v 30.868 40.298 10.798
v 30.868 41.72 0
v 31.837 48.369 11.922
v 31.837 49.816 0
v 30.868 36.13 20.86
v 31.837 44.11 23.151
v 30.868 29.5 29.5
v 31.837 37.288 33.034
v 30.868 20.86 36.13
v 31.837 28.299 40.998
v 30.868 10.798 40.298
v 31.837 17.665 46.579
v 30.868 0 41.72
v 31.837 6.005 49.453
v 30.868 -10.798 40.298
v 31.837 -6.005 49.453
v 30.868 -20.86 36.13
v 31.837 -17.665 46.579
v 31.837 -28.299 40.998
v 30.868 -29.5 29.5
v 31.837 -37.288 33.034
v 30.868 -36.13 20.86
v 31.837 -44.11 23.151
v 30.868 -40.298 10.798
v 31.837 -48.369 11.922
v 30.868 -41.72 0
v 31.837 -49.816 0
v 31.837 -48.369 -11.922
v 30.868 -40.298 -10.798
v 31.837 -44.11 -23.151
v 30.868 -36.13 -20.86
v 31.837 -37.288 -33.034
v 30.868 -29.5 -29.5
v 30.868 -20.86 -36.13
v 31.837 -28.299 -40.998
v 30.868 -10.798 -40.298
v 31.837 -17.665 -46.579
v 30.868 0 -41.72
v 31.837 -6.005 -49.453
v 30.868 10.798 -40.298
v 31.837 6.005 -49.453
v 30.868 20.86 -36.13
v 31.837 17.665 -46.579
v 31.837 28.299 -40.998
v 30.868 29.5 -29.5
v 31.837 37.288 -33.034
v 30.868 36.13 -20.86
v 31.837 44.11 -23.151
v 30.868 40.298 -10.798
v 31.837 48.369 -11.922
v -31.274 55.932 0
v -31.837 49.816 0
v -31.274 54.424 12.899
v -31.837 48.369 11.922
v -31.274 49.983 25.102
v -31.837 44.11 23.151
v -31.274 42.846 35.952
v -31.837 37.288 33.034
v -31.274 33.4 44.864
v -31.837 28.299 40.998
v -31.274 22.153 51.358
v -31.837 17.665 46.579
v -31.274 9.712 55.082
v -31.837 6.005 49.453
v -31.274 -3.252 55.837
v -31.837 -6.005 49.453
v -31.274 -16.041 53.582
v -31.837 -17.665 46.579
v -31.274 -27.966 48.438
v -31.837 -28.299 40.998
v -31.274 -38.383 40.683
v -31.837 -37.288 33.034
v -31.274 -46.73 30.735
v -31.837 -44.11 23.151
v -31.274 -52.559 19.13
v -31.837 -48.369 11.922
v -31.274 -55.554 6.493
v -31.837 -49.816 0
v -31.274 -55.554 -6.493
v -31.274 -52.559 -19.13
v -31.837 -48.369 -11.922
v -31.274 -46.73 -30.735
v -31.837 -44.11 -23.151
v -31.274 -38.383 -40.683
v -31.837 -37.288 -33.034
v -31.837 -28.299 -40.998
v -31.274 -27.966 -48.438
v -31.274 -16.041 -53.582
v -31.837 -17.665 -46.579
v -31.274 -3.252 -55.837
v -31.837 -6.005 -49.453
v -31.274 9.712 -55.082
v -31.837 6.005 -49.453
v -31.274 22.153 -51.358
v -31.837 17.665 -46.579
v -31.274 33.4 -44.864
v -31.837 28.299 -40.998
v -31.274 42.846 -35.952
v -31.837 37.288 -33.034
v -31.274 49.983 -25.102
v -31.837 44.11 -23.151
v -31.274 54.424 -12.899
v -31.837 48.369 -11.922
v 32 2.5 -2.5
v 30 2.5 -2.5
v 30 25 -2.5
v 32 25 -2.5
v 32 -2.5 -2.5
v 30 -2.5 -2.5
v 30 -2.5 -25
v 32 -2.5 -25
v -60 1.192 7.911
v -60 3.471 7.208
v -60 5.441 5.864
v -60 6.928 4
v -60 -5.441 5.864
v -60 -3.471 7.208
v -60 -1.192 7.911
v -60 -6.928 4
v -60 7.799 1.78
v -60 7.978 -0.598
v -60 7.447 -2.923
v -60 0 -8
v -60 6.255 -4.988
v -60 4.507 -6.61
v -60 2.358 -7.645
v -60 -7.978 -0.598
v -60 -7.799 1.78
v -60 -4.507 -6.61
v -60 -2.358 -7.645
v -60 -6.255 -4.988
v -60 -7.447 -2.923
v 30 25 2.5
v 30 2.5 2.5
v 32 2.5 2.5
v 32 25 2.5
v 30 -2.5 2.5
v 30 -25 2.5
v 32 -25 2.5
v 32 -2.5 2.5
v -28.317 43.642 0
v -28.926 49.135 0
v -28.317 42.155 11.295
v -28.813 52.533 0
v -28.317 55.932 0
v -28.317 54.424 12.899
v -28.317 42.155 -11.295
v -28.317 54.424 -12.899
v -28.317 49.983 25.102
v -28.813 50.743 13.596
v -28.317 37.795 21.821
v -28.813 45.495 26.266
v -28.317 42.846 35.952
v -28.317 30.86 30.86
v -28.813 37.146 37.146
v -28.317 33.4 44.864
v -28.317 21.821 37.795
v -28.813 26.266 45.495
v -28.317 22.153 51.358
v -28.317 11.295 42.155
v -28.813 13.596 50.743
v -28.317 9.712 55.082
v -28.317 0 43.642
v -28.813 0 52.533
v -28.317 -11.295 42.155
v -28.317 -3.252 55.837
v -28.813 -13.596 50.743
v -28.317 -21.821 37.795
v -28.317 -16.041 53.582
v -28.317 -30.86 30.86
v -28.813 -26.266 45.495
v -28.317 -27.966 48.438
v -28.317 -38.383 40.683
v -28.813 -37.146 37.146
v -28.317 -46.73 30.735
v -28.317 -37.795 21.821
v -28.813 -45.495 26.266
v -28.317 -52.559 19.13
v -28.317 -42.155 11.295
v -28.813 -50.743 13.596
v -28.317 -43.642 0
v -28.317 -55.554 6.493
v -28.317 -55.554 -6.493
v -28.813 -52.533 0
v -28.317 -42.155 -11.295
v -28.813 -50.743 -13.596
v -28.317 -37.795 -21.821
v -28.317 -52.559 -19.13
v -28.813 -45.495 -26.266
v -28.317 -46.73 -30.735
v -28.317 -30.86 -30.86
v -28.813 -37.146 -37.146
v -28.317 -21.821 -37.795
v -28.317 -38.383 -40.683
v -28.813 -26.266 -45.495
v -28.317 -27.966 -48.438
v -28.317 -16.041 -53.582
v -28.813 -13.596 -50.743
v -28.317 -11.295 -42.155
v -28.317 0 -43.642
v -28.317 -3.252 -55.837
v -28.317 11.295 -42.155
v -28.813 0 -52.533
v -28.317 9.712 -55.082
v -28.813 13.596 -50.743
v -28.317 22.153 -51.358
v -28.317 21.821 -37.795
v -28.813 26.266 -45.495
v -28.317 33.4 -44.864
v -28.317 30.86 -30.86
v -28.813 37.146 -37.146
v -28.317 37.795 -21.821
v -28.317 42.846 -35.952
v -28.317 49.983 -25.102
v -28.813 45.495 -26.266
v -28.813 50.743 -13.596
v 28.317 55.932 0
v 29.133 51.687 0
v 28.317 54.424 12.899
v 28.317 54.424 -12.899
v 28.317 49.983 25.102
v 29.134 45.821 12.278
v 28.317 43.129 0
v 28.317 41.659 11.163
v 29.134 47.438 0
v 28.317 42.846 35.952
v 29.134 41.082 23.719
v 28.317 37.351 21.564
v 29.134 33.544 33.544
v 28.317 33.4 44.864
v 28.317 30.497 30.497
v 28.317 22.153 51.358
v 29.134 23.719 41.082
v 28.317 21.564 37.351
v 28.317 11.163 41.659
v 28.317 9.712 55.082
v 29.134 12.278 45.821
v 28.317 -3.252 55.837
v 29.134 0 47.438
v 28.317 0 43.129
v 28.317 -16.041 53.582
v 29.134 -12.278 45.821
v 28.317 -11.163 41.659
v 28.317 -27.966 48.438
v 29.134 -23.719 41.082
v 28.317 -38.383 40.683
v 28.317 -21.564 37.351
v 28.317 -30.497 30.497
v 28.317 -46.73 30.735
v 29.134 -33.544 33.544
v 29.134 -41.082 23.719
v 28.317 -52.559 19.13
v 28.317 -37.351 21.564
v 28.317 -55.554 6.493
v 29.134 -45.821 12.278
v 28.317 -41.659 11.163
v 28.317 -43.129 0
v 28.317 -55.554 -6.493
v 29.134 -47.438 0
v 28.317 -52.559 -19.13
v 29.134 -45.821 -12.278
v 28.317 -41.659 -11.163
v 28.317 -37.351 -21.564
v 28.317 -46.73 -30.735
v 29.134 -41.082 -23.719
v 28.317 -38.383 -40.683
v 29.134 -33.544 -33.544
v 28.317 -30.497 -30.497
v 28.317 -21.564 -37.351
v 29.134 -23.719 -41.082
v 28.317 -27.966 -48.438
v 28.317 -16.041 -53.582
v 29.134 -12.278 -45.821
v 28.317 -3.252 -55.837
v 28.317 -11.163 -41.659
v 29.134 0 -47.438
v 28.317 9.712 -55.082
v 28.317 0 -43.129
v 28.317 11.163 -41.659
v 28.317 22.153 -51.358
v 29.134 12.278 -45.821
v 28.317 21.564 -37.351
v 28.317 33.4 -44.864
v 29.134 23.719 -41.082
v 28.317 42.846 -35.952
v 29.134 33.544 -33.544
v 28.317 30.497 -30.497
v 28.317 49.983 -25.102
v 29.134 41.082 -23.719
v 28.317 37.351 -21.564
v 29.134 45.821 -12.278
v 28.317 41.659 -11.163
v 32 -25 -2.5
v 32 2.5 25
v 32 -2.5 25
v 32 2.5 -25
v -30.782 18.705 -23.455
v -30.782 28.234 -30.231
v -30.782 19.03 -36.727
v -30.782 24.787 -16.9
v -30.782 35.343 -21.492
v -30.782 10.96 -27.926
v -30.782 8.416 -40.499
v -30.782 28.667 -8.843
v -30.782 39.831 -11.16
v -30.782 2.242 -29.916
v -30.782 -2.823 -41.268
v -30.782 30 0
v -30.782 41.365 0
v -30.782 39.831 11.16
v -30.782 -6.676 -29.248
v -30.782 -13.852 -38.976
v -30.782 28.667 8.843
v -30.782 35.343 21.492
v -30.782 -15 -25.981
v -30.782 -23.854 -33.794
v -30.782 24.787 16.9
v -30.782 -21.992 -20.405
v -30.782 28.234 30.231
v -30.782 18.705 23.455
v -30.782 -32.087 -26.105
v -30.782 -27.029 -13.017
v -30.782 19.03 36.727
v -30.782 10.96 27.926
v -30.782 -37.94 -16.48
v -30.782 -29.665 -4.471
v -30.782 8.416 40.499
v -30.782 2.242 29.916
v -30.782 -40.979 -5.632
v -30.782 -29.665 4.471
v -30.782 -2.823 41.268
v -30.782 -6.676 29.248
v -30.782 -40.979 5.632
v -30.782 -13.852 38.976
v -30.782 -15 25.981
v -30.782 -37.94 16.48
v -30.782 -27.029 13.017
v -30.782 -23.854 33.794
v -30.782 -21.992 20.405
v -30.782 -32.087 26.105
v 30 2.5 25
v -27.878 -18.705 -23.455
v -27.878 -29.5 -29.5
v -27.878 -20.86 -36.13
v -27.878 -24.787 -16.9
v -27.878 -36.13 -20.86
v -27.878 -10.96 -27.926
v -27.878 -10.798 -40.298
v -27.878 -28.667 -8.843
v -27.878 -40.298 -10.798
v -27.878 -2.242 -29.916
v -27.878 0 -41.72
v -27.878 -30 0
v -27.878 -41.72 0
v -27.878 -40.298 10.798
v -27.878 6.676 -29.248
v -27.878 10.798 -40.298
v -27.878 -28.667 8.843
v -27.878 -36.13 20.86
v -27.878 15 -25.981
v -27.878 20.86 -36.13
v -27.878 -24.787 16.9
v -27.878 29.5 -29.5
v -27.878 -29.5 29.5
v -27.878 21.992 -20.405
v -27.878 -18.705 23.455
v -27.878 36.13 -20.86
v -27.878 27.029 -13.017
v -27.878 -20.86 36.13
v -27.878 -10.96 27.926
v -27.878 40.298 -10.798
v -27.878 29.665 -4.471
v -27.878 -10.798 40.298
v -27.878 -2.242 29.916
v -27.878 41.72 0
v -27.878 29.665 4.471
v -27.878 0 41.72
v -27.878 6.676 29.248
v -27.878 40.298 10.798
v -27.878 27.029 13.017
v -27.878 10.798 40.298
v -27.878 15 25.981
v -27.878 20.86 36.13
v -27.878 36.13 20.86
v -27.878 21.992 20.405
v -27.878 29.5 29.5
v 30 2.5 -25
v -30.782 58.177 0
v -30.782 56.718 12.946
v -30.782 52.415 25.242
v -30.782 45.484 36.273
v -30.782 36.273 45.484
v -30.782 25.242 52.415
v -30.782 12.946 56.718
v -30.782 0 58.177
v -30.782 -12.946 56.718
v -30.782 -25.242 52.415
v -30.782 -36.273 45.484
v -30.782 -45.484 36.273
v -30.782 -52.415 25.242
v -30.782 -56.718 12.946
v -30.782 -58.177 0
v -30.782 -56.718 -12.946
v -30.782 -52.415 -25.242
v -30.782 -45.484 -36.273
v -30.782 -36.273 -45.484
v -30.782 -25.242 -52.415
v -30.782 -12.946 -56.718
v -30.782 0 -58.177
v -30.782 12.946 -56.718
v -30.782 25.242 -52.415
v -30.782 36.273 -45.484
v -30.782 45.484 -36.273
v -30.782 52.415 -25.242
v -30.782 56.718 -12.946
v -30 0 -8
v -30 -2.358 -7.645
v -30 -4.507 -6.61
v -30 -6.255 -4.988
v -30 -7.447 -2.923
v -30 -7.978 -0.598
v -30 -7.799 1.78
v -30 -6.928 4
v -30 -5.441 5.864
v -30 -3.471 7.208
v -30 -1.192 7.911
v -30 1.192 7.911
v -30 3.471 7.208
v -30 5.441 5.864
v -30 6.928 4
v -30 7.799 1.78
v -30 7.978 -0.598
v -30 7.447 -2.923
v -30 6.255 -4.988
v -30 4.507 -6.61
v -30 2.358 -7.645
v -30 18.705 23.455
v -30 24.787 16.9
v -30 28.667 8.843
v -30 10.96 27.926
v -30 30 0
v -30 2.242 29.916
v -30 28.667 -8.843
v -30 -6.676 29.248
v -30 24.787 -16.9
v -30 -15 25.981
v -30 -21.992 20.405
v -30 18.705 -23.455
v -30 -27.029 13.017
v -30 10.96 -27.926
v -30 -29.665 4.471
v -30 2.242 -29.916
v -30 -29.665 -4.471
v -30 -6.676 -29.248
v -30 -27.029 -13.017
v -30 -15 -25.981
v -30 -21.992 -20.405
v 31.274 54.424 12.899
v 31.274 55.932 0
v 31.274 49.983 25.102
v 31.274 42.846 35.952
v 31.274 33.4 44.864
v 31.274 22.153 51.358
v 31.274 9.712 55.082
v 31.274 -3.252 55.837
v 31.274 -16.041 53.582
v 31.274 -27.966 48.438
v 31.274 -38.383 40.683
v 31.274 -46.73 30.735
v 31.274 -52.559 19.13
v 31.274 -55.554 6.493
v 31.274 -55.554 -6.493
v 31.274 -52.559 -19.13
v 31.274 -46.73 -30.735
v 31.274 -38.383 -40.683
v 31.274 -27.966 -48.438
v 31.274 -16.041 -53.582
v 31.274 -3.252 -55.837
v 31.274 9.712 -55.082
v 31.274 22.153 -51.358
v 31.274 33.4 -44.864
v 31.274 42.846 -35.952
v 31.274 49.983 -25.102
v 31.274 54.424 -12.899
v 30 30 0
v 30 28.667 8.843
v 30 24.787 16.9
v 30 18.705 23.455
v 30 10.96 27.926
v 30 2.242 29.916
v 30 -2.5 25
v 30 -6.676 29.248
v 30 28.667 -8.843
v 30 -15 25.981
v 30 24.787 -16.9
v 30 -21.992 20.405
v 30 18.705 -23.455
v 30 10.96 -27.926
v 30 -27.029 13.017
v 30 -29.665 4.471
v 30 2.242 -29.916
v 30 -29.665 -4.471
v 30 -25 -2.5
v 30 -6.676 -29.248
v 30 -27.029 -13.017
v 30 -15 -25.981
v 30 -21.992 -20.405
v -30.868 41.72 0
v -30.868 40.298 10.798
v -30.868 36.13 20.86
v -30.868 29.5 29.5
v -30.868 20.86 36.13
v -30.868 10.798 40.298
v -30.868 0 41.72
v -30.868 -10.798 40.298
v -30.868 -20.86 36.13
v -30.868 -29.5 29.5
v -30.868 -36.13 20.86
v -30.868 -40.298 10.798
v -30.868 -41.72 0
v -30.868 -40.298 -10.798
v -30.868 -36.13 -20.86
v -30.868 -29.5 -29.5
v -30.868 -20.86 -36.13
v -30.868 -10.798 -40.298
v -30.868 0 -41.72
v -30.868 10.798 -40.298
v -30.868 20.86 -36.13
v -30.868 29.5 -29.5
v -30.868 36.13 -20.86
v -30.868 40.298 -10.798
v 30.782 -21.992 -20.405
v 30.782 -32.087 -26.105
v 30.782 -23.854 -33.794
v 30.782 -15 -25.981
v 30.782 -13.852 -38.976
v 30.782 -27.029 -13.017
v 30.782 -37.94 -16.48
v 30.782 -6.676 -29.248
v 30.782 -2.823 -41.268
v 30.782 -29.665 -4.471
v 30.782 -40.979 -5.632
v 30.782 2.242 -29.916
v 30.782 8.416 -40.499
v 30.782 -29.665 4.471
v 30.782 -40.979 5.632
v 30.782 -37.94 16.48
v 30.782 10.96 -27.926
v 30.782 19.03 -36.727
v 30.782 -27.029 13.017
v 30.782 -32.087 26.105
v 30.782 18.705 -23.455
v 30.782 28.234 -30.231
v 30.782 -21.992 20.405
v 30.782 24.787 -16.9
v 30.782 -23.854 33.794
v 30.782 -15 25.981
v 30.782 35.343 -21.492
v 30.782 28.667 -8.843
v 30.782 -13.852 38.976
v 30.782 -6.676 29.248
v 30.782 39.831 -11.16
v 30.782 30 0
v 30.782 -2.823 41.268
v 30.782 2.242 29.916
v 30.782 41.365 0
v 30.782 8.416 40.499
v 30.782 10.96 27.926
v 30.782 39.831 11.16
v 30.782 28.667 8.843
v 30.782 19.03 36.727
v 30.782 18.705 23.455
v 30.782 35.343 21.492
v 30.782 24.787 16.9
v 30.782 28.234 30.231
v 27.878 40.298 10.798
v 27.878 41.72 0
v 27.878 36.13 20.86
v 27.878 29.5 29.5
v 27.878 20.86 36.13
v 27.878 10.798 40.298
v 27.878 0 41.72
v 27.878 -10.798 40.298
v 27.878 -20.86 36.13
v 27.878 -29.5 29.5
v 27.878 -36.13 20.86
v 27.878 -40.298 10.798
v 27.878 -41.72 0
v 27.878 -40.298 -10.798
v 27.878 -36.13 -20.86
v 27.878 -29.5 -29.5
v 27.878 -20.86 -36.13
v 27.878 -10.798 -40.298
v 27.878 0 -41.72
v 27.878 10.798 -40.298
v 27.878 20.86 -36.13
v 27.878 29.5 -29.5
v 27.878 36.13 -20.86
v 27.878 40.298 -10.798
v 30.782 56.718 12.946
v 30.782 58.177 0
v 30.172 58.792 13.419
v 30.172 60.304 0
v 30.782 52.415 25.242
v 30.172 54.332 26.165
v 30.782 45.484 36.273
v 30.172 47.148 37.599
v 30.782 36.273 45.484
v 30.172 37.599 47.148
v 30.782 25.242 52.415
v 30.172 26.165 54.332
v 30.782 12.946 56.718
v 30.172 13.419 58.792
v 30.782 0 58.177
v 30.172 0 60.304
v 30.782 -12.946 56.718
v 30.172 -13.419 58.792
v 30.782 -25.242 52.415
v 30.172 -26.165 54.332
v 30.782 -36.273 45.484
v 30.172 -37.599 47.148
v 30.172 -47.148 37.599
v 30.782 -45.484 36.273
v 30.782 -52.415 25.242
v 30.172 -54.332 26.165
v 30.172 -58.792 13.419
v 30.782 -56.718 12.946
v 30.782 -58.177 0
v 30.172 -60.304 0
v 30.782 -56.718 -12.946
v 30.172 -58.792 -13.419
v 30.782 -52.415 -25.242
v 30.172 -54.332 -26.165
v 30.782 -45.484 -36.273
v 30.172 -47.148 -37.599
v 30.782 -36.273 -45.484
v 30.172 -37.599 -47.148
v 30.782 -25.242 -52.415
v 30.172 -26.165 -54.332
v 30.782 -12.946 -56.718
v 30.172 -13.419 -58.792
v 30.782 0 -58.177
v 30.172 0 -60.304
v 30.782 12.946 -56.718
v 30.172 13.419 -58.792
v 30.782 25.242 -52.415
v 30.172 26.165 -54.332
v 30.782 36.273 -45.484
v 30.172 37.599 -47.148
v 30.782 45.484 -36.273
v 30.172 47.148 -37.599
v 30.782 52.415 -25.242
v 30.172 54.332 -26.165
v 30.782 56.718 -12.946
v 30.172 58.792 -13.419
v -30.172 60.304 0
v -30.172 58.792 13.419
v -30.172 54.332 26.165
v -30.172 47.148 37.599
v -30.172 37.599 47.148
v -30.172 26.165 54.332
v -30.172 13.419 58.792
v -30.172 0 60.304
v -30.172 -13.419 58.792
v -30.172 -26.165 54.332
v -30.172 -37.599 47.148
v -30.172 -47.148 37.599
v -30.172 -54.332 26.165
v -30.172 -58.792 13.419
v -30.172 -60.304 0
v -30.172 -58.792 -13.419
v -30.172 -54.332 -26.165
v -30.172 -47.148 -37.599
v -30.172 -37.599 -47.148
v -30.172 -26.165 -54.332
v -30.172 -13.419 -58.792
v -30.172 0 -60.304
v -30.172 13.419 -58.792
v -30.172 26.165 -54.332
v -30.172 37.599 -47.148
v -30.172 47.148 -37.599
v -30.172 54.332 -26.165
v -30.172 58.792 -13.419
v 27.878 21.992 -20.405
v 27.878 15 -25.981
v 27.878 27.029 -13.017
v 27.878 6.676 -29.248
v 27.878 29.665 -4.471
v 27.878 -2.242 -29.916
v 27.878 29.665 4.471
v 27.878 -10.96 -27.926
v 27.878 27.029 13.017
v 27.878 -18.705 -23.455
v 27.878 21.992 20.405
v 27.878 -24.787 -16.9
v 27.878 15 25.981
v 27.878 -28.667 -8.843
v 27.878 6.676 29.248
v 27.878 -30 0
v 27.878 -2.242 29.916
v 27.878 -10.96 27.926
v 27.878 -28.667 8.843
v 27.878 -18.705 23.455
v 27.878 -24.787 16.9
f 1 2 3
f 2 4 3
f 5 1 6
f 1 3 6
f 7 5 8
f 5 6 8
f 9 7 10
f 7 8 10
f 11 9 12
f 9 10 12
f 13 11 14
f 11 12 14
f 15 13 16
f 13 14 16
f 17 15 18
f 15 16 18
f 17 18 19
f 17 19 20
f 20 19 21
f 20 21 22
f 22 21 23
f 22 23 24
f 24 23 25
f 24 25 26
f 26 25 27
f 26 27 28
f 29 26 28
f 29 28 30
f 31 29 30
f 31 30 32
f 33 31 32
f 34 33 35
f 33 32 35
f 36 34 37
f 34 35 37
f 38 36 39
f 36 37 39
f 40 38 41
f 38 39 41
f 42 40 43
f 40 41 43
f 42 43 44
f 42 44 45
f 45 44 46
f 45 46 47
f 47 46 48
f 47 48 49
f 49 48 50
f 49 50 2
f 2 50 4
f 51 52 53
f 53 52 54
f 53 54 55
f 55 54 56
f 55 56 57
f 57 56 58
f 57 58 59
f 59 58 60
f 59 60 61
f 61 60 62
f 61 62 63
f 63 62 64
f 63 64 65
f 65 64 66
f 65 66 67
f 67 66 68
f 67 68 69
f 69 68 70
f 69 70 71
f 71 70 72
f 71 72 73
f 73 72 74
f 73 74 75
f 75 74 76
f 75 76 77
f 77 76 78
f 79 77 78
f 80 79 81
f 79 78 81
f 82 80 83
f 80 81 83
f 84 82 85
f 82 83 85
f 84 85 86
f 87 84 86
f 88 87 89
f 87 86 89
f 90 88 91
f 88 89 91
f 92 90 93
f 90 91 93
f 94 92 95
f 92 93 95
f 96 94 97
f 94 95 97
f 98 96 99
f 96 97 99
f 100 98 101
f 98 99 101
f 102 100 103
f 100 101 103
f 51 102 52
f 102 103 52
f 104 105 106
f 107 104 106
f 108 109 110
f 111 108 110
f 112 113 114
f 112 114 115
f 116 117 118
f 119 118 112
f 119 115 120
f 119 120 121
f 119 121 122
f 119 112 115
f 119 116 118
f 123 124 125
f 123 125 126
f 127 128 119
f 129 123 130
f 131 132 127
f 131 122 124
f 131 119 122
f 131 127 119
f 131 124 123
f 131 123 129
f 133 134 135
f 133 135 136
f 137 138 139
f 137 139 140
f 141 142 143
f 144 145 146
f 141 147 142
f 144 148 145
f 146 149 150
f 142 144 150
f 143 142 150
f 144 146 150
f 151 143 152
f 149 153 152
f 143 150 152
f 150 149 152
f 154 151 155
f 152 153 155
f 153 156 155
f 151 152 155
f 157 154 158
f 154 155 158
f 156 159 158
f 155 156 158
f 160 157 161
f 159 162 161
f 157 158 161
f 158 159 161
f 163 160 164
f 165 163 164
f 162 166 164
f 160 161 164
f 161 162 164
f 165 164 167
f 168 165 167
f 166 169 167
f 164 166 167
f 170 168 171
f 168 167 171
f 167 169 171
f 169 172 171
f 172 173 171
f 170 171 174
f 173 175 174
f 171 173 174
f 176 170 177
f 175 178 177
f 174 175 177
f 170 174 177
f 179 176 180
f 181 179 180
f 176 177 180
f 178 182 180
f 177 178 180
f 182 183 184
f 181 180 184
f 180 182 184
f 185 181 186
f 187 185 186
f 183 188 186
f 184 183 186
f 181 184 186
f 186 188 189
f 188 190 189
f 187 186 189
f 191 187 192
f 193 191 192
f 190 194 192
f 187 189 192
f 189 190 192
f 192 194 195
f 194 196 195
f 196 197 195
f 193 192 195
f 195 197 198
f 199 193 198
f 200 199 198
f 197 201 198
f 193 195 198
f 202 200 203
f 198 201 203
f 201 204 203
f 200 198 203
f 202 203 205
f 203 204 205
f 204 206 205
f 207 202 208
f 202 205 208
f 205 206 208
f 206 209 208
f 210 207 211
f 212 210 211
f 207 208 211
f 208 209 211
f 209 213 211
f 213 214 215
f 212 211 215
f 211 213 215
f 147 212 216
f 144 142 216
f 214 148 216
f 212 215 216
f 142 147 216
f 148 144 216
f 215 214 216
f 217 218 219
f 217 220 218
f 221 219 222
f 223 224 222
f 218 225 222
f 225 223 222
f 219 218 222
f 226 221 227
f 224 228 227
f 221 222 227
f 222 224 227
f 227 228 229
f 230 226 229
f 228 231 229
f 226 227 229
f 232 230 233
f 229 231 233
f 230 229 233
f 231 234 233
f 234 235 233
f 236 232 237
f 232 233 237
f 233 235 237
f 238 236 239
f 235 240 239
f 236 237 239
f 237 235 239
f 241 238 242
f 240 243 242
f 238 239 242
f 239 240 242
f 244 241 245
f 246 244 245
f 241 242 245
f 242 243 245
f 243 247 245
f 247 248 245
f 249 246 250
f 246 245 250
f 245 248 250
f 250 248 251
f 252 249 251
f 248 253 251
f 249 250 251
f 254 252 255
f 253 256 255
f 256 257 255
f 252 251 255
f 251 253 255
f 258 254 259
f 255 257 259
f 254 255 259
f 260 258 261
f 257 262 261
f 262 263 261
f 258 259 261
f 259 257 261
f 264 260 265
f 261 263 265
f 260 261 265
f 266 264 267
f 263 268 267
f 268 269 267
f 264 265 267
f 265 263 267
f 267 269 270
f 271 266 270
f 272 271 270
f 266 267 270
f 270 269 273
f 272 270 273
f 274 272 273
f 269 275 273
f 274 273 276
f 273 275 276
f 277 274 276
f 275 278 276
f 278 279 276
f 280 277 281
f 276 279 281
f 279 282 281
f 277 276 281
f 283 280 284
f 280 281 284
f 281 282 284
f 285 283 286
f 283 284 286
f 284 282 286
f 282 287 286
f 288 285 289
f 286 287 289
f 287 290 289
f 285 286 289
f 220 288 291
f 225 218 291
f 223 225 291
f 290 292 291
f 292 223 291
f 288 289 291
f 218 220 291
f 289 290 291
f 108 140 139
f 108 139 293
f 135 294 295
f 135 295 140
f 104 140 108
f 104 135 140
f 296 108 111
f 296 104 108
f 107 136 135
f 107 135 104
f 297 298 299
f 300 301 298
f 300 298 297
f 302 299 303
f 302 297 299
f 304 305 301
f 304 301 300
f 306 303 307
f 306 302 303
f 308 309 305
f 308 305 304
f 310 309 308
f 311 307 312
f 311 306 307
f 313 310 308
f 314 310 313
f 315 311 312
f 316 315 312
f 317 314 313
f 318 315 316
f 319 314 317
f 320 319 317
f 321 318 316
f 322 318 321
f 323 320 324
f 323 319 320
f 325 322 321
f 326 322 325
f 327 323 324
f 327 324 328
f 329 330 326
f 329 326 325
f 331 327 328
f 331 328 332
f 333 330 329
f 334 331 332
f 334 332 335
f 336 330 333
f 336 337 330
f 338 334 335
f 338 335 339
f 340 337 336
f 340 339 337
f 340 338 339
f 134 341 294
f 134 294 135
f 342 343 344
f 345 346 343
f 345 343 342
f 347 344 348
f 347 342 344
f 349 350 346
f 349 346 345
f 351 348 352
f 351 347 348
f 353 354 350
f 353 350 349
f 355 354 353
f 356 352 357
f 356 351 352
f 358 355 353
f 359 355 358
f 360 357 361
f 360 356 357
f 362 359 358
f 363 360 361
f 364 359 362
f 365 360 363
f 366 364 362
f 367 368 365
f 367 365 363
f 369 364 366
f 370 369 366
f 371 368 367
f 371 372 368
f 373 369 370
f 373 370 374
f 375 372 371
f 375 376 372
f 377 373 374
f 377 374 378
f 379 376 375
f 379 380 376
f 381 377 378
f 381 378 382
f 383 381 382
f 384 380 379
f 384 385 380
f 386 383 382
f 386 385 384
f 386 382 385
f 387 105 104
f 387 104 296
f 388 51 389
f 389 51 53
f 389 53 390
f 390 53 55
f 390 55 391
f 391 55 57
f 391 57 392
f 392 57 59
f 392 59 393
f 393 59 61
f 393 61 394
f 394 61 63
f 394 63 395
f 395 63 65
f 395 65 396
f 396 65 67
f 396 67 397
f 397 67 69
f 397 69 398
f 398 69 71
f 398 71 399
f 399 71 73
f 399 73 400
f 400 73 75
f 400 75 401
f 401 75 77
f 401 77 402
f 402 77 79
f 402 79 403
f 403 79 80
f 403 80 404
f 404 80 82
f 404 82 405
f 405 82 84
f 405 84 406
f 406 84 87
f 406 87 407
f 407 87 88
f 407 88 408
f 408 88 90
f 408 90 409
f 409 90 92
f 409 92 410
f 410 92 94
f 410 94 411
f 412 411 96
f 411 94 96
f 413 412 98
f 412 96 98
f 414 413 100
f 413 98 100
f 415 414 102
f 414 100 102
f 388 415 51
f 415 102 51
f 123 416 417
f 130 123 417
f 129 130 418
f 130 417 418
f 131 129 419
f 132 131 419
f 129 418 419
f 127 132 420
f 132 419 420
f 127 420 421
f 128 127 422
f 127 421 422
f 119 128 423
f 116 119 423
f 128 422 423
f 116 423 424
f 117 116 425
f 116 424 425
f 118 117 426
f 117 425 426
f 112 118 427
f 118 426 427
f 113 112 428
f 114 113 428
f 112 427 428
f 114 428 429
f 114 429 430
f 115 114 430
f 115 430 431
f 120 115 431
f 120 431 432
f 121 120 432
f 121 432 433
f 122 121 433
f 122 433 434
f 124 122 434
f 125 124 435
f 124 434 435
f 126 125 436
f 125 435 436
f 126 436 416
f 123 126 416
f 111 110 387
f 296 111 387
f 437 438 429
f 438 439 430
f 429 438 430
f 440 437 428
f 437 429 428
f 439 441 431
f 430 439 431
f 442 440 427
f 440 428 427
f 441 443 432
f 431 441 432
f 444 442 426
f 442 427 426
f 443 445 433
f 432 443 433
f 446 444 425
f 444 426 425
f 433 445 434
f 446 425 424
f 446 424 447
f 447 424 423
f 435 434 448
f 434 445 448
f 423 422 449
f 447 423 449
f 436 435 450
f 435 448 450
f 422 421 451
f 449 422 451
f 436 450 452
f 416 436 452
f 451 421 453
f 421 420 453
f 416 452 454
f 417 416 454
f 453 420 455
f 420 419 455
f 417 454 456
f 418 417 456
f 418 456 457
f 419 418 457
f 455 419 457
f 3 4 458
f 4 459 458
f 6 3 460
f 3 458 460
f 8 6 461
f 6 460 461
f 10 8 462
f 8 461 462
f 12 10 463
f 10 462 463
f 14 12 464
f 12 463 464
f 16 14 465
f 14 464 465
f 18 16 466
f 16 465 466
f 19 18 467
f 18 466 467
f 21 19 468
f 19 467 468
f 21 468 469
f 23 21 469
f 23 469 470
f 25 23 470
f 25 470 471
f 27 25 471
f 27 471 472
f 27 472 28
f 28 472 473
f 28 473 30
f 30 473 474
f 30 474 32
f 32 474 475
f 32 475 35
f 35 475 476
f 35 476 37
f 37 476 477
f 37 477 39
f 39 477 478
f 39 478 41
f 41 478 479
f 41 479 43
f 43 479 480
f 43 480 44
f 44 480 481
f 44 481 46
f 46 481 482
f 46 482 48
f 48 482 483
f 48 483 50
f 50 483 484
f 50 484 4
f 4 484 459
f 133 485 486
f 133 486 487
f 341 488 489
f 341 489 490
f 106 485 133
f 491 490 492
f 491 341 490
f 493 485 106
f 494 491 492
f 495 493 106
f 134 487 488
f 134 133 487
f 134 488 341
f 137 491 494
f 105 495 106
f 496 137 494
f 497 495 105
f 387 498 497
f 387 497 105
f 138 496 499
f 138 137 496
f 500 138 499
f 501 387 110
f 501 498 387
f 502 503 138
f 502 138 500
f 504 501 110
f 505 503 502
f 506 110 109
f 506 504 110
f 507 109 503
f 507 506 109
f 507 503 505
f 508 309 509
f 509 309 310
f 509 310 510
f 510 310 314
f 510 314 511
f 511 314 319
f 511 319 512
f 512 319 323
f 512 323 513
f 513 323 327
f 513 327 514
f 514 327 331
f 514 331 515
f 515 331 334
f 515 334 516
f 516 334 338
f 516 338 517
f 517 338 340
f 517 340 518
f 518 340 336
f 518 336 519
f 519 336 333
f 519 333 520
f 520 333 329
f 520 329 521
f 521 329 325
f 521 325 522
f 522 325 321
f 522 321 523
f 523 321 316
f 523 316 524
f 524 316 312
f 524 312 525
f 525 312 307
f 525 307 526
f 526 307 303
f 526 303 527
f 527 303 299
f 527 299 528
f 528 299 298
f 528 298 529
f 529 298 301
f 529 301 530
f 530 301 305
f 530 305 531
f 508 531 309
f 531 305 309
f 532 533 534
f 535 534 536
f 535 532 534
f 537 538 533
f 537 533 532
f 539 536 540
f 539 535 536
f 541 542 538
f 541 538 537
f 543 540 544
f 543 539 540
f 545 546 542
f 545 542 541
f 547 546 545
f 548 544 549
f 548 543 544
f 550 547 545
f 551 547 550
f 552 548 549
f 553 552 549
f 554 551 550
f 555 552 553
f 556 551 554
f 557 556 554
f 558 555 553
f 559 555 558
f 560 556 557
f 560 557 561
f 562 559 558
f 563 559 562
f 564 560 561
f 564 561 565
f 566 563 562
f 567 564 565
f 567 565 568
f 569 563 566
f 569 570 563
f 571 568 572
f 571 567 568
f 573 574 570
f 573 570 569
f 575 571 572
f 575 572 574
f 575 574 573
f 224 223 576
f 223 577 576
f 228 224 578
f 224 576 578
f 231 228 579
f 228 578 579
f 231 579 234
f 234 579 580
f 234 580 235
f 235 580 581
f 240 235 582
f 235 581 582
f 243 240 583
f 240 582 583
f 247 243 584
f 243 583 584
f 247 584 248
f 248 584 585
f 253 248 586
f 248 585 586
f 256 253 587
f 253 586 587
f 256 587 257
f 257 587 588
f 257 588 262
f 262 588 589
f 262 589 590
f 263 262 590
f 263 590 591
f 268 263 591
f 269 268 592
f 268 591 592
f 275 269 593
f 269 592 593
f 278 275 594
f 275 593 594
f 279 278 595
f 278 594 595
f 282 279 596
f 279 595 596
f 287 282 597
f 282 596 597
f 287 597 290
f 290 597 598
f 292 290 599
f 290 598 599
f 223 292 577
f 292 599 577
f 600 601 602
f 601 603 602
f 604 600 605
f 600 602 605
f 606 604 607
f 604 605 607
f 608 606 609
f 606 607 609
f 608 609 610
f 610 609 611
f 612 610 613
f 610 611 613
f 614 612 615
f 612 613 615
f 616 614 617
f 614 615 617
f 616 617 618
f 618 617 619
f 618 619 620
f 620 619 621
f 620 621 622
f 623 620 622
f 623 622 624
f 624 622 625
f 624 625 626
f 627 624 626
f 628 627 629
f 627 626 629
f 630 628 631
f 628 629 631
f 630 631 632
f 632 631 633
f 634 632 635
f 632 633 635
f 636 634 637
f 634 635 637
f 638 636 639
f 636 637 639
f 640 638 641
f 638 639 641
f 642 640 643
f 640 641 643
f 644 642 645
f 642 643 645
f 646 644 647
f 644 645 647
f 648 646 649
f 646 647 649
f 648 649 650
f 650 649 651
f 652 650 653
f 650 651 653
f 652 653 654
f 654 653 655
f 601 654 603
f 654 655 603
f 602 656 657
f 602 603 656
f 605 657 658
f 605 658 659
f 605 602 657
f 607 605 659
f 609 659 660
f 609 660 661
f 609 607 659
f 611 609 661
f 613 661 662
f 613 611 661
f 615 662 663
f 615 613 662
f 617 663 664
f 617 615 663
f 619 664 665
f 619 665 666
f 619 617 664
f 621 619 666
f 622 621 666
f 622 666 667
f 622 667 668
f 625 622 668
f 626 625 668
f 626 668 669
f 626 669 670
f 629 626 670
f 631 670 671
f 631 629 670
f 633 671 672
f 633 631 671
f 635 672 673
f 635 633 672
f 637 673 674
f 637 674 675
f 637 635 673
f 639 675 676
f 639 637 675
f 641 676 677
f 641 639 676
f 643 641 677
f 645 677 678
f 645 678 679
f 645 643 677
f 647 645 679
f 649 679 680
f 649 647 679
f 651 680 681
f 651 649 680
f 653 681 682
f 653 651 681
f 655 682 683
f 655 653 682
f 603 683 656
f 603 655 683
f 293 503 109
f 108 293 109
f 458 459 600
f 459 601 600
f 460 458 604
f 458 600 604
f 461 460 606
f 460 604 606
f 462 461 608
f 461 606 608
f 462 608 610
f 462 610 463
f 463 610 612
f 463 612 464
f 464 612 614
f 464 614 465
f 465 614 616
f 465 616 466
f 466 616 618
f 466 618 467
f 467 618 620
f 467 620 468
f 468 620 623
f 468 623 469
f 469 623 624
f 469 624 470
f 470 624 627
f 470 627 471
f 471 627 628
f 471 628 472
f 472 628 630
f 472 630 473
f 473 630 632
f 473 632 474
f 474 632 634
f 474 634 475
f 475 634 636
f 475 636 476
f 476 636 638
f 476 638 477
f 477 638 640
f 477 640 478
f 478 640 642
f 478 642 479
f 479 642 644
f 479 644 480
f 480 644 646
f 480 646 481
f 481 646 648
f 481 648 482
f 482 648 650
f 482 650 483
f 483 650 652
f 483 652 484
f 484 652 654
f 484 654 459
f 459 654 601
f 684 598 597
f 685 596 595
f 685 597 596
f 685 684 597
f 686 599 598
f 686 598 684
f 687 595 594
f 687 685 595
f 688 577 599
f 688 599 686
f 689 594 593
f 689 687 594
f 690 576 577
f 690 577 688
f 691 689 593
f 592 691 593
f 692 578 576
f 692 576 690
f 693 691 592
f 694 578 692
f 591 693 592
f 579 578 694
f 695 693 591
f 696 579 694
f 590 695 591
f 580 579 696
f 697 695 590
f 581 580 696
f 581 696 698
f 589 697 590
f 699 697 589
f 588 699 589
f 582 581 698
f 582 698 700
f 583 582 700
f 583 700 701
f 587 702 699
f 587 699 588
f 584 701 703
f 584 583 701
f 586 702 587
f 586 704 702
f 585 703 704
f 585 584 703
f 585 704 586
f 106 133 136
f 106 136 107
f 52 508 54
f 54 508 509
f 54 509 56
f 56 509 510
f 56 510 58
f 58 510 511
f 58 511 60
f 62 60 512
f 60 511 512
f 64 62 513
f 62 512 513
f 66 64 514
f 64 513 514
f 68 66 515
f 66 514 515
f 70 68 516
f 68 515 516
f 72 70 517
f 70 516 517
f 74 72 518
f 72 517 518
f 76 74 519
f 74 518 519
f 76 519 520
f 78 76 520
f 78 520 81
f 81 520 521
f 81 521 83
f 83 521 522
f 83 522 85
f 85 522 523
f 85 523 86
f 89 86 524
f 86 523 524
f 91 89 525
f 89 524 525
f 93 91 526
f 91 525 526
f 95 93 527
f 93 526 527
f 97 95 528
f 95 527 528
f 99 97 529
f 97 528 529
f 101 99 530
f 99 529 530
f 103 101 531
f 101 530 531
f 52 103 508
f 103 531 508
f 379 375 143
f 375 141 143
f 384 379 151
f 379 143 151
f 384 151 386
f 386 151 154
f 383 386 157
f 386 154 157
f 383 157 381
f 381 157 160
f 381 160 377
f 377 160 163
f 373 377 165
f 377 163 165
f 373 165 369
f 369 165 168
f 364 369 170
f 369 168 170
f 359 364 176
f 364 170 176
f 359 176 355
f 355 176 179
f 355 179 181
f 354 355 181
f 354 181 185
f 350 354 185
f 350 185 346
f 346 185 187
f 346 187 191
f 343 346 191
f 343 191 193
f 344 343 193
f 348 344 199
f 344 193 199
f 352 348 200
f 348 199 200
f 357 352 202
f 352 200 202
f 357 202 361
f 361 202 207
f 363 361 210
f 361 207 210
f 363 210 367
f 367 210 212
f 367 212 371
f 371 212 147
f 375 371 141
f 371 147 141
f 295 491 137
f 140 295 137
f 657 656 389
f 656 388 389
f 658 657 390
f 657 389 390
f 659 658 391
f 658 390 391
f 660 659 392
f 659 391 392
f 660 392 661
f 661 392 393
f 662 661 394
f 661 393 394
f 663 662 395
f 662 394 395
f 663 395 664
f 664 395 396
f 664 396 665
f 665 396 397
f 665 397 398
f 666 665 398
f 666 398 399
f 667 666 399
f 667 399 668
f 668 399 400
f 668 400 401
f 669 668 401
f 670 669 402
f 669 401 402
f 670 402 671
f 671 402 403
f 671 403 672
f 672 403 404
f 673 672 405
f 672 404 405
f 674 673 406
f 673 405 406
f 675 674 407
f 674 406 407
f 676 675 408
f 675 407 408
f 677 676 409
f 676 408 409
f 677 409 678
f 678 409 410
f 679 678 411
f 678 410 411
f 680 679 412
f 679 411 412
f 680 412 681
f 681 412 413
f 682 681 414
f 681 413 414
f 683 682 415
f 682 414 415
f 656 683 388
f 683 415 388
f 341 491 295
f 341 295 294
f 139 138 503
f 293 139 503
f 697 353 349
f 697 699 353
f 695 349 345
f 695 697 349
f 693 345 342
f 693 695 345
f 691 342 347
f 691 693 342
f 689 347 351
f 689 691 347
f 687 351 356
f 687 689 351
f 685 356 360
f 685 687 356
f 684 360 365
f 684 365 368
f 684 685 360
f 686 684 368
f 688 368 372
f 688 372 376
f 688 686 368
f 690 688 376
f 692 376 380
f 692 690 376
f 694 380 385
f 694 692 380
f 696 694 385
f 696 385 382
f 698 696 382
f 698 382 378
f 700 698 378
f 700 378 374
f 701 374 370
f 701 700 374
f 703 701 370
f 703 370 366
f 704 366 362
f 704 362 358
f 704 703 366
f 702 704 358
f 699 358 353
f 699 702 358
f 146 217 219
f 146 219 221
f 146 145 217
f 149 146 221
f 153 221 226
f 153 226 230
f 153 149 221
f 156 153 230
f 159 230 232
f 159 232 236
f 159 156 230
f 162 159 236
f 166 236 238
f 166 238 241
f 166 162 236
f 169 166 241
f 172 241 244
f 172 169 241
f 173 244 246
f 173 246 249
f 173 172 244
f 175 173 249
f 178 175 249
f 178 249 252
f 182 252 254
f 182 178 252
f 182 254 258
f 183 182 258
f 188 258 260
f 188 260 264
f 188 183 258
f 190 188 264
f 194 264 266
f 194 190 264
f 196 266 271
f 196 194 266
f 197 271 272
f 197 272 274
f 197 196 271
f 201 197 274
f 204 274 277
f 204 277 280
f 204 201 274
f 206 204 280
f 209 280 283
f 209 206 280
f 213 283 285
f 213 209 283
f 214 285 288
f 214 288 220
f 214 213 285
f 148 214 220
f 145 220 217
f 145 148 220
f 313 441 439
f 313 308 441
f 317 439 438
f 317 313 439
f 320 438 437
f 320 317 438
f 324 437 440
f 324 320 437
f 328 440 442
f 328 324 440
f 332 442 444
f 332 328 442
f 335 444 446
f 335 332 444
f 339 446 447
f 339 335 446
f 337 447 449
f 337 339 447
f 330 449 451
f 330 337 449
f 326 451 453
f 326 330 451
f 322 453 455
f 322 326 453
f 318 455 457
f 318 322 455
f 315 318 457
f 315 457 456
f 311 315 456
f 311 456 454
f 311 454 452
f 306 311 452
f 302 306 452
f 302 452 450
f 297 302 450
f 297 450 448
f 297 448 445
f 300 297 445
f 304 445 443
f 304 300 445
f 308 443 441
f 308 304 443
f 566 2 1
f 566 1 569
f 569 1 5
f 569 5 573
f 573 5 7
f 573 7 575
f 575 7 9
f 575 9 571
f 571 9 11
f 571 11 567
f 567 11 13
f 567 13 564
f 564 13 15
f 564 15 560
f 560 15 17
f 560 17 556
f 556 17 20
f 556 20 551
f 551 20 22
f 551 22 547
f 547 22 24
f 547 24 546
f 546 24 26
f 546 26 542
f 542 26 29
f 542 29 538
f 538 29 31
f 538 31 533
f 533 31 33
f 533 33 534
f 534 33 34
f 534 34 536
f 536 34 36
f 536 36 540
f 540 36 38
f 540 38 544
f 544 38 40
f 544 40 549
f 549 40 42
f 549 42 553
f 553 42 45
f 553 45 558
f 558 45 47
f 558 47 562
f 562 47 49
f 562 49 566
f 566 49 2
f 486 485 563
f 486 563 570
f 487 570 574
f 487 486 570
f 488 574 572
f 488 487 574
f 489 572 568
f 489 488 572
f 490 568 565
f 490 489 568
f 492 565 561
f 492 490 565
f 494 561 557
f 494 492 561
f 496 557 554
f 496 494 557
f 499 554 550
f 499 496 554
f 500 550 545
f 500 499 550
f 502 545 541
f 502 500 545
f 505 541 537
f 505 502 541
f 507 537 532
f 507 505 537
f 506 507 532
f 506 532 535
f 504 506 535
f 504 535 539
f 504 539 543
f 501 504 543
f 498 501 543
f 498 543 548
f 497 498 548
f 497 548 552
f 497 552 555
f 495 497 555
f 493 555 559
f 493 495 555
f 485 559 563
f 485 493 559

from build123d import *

# Parameters (mm, degrees)
REVOLVE_1_OUTLINE_W   = 0.355269541
REVOLVE_1_OUTLINE_H   = 0.438478825
REVOLVE_1_OUTLINE_W_2 = 11.364624133
REVOLVE_1_OUTLINE_W_3 = 4.372569082
REVOLVE_1_OUTLINE_H_2 = 55.75634902
REVOLVE_1_OUTLINE_H_3 = 1.854936884
REVOLVE_1_OUTLINE_W_4 = 14.211965544
REVOLVE_1_OUTLINE_H_4 = 0.61022171
SKETCH_2_R            = 30
EXTRUDE_1_DEPTH       = 30
SKETCH_3_R            = 8
EXTRUDE_2_DEPTH       = 30
SKETCH_4_W            = 5
SKETCH_4_H            = 22.5
SKETCH_4_W_2          = 22.5
SKETCH_4_H_2          = 5
EXTRUDE_3_DEPTH       = 2


# Read off the part's stored shape, not the designer's step: 회전1
with BuildPart() as part:
    # 회전1 outline → 회전1 (revolve)
    with BuildSketch(Plane.YX):
        with Locations((41.542258903, -28.097413923)):
            Rectangle(REVOLVE_1_OUTLINE_W, REVOLVE_1_OUTLINE_H)
        with BuildLine():
            add(Edge.make_bspline(
                [(41.719893674, -27.87817451), (41.894749248, -27.921618592), (42.252720208, -28.01137838), (42.873298399, -28.15700866), (43.341279515, -28.256769587), (43.642191366, -28.316653335)],
                knots=[0.117139278, 0.117139278, 0.117139278, 0.117139278, 0.14529069, 0.173442101, 0.224513922, 0.224513922, 0.224513922, 0.224513922], degree=3))
            Line((41.719893674, -27.87817451), (41.719893674, -28.316653335))
            Line((41.719893674, -28.316653335), (43.642191366, -28.316653335))
        make_face()
        with BuildLine():
            add(Edge.make_bspline(
                [(43.642191366, -28.316653335), (43.673012094, -28.322786894), (44.367114713, -28.459908676), (46.367881136, -28.788520691), (49.637320271, -29.015805628), (53.021708434, -28.821695589), (55.131271584, -28.478533008), (55.931859218, -28.316653335)],
                knots=[0.224513922, 0.224513922, 0.224513922, 0.224513922, 0.229744924, 0.34235057, 0.567561862, 0.792773154, 0.932194296, 0.932194296, 0.932194296, 0.932194296], degree=3))
            Line((43.642191366, -28.316653335), (41.719893674, -28.316653335))
            Line((41.719893674, -28.316653335), (41.719893674, -30.171590219))
            Line((41.719893674, -30.171590219), (55.931859218, -30.171590219))
            Line((55.931859218, -30.171590219), (55.931859218, -28.316653335))
        make_face()
        with Locations((35.682312067, -28.097413923)):
            Rectangle(REVOLVE_1_OUTLINE_W_2, REVOLVE_1_OUTLINE_H)
        with Locations((58.118143759, -28.097413923)):
            Rectangle(REVOLVE_1_OUTLINE_W_3, REVOLVE_1_OUTLINE_H)
        with Locations((58.118143759, 0)):
            Rectangle(REVOLVE_1_OUTLINE_W_3, REVOLVE_1_OUTLINE_H_2)
        with BuildLine():
            Line((41.719893674, 28.316653335), (41.719893674, 27.87817451))
            add(Edge.make_bspline(
                [(43.128876316, 28.316653335), (42.973861456, 28.272694047), (42.669494175, 28.183372992), (42.227403007, 28.044794313), (41.884836208, 27.931979132), (41.719893674, 27.87817451)],
                knots=[0.937972384, 0.937972384, 0.937972384, 0.937972384, 0.966974102, 0.995182728, 1.023391355, 1.023391355, 1.023391355, 1.023391355], degree=3))
            Line((43.128876316, 28.316653335), (41.719893674, 28.316653335))
        make_face()
        with Locations((41.542258903, 28.097413923)):
            Rectangle(REVOLVE_1_OUTLINE_W, REVOLVE_1_OUTLINE_H)
        with Locations((41.542258903, -29.244121777)):
            Rectangle(REVOLVE_1_OUTLINE_W, REVOLVE_1_OUTLINE_H_3)
        with Locations((58.118143759, -29.244121777)):
            Rectangle(REVOLVE_1_OUTLINE_W_3, REVOLVE_1_OUTLINE_H_3)
        with Locations((35.682312067, -29.244121777)):
            Rectangle(REVOLVE_1_OUTLINE_W_2, REVOLVE_1_OUTLINE_H_3)
        with Locations((35.682312067, 28.097413923)):
            Rectangle(REVOLVE_1_OUTLINE_W_2, REVOLVE_1_OUTLINE_H)
        with Locations((58.118143759, 28.097413923)):
            Rectangle(REVOLVE_1_OUTLINE_W_3, REVOLVE_1_OUTLINE_H)
        with BuildLine():
            Line((41.719893674, 28.316653335), (43.128876316, 28.316653335))
            add(Edge.make_bspline(
                [(55.931859218, 28.316653335), (55.350466054, 28.484554725), (54.483083768, 28.700477141), (53.332821917, 28.919070087), (52.621816991, 29.026887301), (51.140275095, 29.207221888), (48.779721438, 29.304602769), (45.95584246, 28.998713875), (44.028351242, 28.564756145), (43.275412999, 28.358208372), (43.128876316, 28.316653335)],
                knots=[0.120715306, 0.120715306, 0.120715306, 0.120715306, 0.233549812, 0.285972839, 0.342390092, 0.370598718, 0.57205333, 0.797722342, 0.910556849, 0.937972384, 0.937972384, 0.937972384, 0.937972384], degree=3))
            Line((55.931859218, 28.316653335), (55.931859218, 30.171590219))
            Line((55.931859218, 30.171590219), (41.719893674, 30.171590219))
            Line((41.719893674, 30.171590219), (41.719893674, 28.316653335))
        make_face()
        with Locations((41.542258903, 29.244121777)):
            Rectangle(REVOLVE_1_OUTLINE_W, REVOLVE_1_OUTLINE_H_3)
        with Locations((48.825876446, -30.476701074)):
            Rectangle(REVOLVE_1_OUTLINE_W_4, REVOLVE_1_OUTLINE_H_4)
        with Locations((41.542258903, -30.476701074)):
            Rectangle(REVOLVE_1_OUTLINE_W, REVOLVE_1_OUTLINE_H_4)
        with BuildLine():
            Line((60.3044283, -30.171590219), (55.931859218, -30.171590219))
            Line((55.931859218, -30.171590219), (55.931859218, -30.781811929))
            Line((55.931859218, -30.781811929), (58.176696805, -30.781811929))
            add(Edge.make_bspline(
                [(60.3044283, -30.171590219), (59.242057092, -30.511353598), (58.176696805, -30.781811929)],
                knots=[0, 0, 0, 0.113573553, 0.113573553, 0.113573553], degree=2))
        make_face()
        with Locations((35.682312067, -30.476701074)):
            Rectangle(REVOLVE_1_OUTLINE_W_2, REVOLVE_1_OUTLINE_H_4)
        with Locations((35.682312067, 29.244121777)):
            Rectangle(REVOLVE_1_OUTLINE_W_2, REVOLVE_1_OUTLINE_H_3)
        with Locations((58.118143759, 29.244121777)):
            Rectangle(REVOLVE_1_OUTLINE_W_3, REVOLVE_1_OUTLINE_H_3)
        with Locations((41.542258903, 30.476701074)):
            Rectangle(REVOLVE_1_OUTLINE_W, REVOLVE_1_OUTLINE_H_4)
        with Locations((48.825876446, 30.476701074)):
            Rectangle(REVOLVE_1_OUTLINE_W_4, REVOLVE_1_OUTLINE_H_4)
        with BuildLine():
            Line((55.931859218, -30.781811929), (41.719893674, -30.781811929))
            Line((41.719893674, -30.781811929), (41.719893674, -30.868243844))
            add(Edge.make_bspline(
                [(49.816181075, -31.837257545), (45.788933817, -31.837257541), (41.719893674, -30.868243844)],
                knots=[0.556786778, 0.556786778, 0.556786778, 0.981464752, 0.981464752, 0.981464752], degree=2))
            add(Edge.make_bspline(
                [(55.931859218, -31.274158213), (52.886163188, -31.837257547), (49.816181075, -31.837257545)],
                knots=[0.233053543, 0.233053543, 0.233053543, 0.556786778, 0.556786778, 0.556786778], degree=2))
            Line((55.931859218, -31.274158213), (55.931859218, -30.781811929))
        make_face()
        with BuildLine():
            Line((41.719893674, -30.868243844), (41.719893674, -30.781811929))
            Line((41.719893674, -30.781811929), (41.364624133, -30.781811929))
            add(Edge.make_bspline(
                [(41.719893674, -30.868243844), (41.54229871, -30.825950834), (41.364624133, -30.781811929)],
                knots=[0.981464752, 0.981464752, 0.981464752, 1, 1, 1], degree=2))
        make_face()
        with BuildLine():
            Line((58.176696805, -30.781811929), (55.931859218, -30.781811929))
            Line((55.931859218, -30.781811929), (55.931859218, -31.274158213))
            add(Edge.make_bspline(
                [(58.176696805, -30.781811929), (57.055932041, -31.066335551), (55.931859218, -31.274158213)],
                knots=[0.113573553, 0.113573553, 0.113573553, 0.233053543, 0.233053543, 0.233053543], degree=2))
        make_face()
        with Locations((35.682312067, 30.476701074)):
            Rectangle(REVOLVE_1_OUTLINE_W_2, REVOLVE_1_OUTLINE_H_4)
        with BuildLine():
            Line((55.931859218, 30.781811929), (55.931859218, 30.171590219))
            Line((55.931859218, 30.171590219), (60.3044283, 30.171590219))
            add(Edge.make_bspline(
                [(58.176696805, 30.781811929), (59.242057092, 30.511353598), (60.3044283, 30.171590219)],
                knots=[0.886426447, 0.886426447, 0.886426447, 1, 1, 1], degree=2))
            Line((58.176696805, 30.781811929), (55.931859218, 30.781811929))
        make_face()
        with BuildLine():
            Line((41.364624133, 30.781811929), (41.719893674, 30.781811929))
            Line((41.719893674, 30.781811929), (41.719893674, 30.868243844))
            add(Edge.make_bspline(
                [(41.364624133, 30.781811929), (41.54229871, 30.825950834), (41.719893674, 30.868243844)],
                knots=[0, 0, 0, 0.018535248, 0.018535248, 0.018535248], degree=2))
        make_face()
        with BuildLine():
            Line((41.719893674, 30.868243844), (41.719893674, 30.781811929))
            Line((41.719893674, 30.781811929), (55.931859218, 30.781811929))
            Line((55.931859218, 30.781811929), (55.931859218, 31.274158213))
            add(Edge.make_bspline(
                [(49.816181262, 31.837257545), (52.886163281, 31.83725753), (55.931859218, 31.274158213)],
                knots=[0.443213232, 0.443213232, 0.443213232, 0.766946457, 0.766946457, 0.766946457], degree=2))
            add(Edge.make_bspline(
                [(41.719893674, 30.868243844), (45.788933912, 31.837257564), (49.816181262, 31.837257545)],
                knots=[0.018535248, 0.018535248, 0.018535248, 0.443213232, 0.443213232, 0.443213232], degree=2))
        make_face()
        with BuildLine():
            Line((55.931859218, 31.274158213), (55.931859218, 30.781811929))
            Line((55.931859218, 30.781811929), (58.176696805, 30.781811929))
            add(Edge.make_bspline(
                [(55.931859218, 31.274158213), (57.055932041, 31.066335551), (58.176696805, 30.781811929)],
                knots=[0.766946457, 0.766946457, 0.766946457, 0.886426447, 0.886426447, 0.886426447], degree=2))
        make_face()
    revolve(axis=Axis((0, 0, 0), (1, 0, 0)))

    # 스케치2 → 보스-돌출1 (add, symmetric)
    with BuildSketch(Plane(origin=(0, 0, 0), x_dir=(0, 0, -1), z_dir=(1, 0, 0))):
        with Locations(Location((0, 0, 0), (0, 0, 270))):
            Circle(SKETCH_2_R)
    extrude(amount=EXTRUDE_1_DEPTH, both=True)

    # 스케치3 → 보스-돌출2 (add)
    with BuildSketch(Plane.ZY.offset(30)):
        with Locations(Location((0, 0, 0), (0, 0, 180))):
            Circle(SKETCH_3_R)
    extrude(amount=EXTRUDE_2_DEPTH)

    # 스케치4 → 보스-돌출3 (add)
    with BuildSketch(Plane(origin=(30, 0, 0), x_dir=(0, 0, -1), z_dir=(1, 0, 0))):
        with Locations((0, 13.75)):
            Rectangle(SKETCH_4_W, SKETCH_4_H)
        with Locations((-13.75, 0)):
            Rectangle(SKETCH_4_W_2, SKETCH_4_H_2)
        Rectangle(SKETCH_4_W, SKETCH_4_H_2)
        with Locations((13.75, 0)):
            Rectangle(SKETCH_4_W_2, SKETCH_4_H_2)
        with Locations((0, -13.75)):
            Rectangle(SKETCH_4_W, SKETCH_4_H)
    extrude(amount=EXTRUDE_3_DEPTH)


solid = part.part
